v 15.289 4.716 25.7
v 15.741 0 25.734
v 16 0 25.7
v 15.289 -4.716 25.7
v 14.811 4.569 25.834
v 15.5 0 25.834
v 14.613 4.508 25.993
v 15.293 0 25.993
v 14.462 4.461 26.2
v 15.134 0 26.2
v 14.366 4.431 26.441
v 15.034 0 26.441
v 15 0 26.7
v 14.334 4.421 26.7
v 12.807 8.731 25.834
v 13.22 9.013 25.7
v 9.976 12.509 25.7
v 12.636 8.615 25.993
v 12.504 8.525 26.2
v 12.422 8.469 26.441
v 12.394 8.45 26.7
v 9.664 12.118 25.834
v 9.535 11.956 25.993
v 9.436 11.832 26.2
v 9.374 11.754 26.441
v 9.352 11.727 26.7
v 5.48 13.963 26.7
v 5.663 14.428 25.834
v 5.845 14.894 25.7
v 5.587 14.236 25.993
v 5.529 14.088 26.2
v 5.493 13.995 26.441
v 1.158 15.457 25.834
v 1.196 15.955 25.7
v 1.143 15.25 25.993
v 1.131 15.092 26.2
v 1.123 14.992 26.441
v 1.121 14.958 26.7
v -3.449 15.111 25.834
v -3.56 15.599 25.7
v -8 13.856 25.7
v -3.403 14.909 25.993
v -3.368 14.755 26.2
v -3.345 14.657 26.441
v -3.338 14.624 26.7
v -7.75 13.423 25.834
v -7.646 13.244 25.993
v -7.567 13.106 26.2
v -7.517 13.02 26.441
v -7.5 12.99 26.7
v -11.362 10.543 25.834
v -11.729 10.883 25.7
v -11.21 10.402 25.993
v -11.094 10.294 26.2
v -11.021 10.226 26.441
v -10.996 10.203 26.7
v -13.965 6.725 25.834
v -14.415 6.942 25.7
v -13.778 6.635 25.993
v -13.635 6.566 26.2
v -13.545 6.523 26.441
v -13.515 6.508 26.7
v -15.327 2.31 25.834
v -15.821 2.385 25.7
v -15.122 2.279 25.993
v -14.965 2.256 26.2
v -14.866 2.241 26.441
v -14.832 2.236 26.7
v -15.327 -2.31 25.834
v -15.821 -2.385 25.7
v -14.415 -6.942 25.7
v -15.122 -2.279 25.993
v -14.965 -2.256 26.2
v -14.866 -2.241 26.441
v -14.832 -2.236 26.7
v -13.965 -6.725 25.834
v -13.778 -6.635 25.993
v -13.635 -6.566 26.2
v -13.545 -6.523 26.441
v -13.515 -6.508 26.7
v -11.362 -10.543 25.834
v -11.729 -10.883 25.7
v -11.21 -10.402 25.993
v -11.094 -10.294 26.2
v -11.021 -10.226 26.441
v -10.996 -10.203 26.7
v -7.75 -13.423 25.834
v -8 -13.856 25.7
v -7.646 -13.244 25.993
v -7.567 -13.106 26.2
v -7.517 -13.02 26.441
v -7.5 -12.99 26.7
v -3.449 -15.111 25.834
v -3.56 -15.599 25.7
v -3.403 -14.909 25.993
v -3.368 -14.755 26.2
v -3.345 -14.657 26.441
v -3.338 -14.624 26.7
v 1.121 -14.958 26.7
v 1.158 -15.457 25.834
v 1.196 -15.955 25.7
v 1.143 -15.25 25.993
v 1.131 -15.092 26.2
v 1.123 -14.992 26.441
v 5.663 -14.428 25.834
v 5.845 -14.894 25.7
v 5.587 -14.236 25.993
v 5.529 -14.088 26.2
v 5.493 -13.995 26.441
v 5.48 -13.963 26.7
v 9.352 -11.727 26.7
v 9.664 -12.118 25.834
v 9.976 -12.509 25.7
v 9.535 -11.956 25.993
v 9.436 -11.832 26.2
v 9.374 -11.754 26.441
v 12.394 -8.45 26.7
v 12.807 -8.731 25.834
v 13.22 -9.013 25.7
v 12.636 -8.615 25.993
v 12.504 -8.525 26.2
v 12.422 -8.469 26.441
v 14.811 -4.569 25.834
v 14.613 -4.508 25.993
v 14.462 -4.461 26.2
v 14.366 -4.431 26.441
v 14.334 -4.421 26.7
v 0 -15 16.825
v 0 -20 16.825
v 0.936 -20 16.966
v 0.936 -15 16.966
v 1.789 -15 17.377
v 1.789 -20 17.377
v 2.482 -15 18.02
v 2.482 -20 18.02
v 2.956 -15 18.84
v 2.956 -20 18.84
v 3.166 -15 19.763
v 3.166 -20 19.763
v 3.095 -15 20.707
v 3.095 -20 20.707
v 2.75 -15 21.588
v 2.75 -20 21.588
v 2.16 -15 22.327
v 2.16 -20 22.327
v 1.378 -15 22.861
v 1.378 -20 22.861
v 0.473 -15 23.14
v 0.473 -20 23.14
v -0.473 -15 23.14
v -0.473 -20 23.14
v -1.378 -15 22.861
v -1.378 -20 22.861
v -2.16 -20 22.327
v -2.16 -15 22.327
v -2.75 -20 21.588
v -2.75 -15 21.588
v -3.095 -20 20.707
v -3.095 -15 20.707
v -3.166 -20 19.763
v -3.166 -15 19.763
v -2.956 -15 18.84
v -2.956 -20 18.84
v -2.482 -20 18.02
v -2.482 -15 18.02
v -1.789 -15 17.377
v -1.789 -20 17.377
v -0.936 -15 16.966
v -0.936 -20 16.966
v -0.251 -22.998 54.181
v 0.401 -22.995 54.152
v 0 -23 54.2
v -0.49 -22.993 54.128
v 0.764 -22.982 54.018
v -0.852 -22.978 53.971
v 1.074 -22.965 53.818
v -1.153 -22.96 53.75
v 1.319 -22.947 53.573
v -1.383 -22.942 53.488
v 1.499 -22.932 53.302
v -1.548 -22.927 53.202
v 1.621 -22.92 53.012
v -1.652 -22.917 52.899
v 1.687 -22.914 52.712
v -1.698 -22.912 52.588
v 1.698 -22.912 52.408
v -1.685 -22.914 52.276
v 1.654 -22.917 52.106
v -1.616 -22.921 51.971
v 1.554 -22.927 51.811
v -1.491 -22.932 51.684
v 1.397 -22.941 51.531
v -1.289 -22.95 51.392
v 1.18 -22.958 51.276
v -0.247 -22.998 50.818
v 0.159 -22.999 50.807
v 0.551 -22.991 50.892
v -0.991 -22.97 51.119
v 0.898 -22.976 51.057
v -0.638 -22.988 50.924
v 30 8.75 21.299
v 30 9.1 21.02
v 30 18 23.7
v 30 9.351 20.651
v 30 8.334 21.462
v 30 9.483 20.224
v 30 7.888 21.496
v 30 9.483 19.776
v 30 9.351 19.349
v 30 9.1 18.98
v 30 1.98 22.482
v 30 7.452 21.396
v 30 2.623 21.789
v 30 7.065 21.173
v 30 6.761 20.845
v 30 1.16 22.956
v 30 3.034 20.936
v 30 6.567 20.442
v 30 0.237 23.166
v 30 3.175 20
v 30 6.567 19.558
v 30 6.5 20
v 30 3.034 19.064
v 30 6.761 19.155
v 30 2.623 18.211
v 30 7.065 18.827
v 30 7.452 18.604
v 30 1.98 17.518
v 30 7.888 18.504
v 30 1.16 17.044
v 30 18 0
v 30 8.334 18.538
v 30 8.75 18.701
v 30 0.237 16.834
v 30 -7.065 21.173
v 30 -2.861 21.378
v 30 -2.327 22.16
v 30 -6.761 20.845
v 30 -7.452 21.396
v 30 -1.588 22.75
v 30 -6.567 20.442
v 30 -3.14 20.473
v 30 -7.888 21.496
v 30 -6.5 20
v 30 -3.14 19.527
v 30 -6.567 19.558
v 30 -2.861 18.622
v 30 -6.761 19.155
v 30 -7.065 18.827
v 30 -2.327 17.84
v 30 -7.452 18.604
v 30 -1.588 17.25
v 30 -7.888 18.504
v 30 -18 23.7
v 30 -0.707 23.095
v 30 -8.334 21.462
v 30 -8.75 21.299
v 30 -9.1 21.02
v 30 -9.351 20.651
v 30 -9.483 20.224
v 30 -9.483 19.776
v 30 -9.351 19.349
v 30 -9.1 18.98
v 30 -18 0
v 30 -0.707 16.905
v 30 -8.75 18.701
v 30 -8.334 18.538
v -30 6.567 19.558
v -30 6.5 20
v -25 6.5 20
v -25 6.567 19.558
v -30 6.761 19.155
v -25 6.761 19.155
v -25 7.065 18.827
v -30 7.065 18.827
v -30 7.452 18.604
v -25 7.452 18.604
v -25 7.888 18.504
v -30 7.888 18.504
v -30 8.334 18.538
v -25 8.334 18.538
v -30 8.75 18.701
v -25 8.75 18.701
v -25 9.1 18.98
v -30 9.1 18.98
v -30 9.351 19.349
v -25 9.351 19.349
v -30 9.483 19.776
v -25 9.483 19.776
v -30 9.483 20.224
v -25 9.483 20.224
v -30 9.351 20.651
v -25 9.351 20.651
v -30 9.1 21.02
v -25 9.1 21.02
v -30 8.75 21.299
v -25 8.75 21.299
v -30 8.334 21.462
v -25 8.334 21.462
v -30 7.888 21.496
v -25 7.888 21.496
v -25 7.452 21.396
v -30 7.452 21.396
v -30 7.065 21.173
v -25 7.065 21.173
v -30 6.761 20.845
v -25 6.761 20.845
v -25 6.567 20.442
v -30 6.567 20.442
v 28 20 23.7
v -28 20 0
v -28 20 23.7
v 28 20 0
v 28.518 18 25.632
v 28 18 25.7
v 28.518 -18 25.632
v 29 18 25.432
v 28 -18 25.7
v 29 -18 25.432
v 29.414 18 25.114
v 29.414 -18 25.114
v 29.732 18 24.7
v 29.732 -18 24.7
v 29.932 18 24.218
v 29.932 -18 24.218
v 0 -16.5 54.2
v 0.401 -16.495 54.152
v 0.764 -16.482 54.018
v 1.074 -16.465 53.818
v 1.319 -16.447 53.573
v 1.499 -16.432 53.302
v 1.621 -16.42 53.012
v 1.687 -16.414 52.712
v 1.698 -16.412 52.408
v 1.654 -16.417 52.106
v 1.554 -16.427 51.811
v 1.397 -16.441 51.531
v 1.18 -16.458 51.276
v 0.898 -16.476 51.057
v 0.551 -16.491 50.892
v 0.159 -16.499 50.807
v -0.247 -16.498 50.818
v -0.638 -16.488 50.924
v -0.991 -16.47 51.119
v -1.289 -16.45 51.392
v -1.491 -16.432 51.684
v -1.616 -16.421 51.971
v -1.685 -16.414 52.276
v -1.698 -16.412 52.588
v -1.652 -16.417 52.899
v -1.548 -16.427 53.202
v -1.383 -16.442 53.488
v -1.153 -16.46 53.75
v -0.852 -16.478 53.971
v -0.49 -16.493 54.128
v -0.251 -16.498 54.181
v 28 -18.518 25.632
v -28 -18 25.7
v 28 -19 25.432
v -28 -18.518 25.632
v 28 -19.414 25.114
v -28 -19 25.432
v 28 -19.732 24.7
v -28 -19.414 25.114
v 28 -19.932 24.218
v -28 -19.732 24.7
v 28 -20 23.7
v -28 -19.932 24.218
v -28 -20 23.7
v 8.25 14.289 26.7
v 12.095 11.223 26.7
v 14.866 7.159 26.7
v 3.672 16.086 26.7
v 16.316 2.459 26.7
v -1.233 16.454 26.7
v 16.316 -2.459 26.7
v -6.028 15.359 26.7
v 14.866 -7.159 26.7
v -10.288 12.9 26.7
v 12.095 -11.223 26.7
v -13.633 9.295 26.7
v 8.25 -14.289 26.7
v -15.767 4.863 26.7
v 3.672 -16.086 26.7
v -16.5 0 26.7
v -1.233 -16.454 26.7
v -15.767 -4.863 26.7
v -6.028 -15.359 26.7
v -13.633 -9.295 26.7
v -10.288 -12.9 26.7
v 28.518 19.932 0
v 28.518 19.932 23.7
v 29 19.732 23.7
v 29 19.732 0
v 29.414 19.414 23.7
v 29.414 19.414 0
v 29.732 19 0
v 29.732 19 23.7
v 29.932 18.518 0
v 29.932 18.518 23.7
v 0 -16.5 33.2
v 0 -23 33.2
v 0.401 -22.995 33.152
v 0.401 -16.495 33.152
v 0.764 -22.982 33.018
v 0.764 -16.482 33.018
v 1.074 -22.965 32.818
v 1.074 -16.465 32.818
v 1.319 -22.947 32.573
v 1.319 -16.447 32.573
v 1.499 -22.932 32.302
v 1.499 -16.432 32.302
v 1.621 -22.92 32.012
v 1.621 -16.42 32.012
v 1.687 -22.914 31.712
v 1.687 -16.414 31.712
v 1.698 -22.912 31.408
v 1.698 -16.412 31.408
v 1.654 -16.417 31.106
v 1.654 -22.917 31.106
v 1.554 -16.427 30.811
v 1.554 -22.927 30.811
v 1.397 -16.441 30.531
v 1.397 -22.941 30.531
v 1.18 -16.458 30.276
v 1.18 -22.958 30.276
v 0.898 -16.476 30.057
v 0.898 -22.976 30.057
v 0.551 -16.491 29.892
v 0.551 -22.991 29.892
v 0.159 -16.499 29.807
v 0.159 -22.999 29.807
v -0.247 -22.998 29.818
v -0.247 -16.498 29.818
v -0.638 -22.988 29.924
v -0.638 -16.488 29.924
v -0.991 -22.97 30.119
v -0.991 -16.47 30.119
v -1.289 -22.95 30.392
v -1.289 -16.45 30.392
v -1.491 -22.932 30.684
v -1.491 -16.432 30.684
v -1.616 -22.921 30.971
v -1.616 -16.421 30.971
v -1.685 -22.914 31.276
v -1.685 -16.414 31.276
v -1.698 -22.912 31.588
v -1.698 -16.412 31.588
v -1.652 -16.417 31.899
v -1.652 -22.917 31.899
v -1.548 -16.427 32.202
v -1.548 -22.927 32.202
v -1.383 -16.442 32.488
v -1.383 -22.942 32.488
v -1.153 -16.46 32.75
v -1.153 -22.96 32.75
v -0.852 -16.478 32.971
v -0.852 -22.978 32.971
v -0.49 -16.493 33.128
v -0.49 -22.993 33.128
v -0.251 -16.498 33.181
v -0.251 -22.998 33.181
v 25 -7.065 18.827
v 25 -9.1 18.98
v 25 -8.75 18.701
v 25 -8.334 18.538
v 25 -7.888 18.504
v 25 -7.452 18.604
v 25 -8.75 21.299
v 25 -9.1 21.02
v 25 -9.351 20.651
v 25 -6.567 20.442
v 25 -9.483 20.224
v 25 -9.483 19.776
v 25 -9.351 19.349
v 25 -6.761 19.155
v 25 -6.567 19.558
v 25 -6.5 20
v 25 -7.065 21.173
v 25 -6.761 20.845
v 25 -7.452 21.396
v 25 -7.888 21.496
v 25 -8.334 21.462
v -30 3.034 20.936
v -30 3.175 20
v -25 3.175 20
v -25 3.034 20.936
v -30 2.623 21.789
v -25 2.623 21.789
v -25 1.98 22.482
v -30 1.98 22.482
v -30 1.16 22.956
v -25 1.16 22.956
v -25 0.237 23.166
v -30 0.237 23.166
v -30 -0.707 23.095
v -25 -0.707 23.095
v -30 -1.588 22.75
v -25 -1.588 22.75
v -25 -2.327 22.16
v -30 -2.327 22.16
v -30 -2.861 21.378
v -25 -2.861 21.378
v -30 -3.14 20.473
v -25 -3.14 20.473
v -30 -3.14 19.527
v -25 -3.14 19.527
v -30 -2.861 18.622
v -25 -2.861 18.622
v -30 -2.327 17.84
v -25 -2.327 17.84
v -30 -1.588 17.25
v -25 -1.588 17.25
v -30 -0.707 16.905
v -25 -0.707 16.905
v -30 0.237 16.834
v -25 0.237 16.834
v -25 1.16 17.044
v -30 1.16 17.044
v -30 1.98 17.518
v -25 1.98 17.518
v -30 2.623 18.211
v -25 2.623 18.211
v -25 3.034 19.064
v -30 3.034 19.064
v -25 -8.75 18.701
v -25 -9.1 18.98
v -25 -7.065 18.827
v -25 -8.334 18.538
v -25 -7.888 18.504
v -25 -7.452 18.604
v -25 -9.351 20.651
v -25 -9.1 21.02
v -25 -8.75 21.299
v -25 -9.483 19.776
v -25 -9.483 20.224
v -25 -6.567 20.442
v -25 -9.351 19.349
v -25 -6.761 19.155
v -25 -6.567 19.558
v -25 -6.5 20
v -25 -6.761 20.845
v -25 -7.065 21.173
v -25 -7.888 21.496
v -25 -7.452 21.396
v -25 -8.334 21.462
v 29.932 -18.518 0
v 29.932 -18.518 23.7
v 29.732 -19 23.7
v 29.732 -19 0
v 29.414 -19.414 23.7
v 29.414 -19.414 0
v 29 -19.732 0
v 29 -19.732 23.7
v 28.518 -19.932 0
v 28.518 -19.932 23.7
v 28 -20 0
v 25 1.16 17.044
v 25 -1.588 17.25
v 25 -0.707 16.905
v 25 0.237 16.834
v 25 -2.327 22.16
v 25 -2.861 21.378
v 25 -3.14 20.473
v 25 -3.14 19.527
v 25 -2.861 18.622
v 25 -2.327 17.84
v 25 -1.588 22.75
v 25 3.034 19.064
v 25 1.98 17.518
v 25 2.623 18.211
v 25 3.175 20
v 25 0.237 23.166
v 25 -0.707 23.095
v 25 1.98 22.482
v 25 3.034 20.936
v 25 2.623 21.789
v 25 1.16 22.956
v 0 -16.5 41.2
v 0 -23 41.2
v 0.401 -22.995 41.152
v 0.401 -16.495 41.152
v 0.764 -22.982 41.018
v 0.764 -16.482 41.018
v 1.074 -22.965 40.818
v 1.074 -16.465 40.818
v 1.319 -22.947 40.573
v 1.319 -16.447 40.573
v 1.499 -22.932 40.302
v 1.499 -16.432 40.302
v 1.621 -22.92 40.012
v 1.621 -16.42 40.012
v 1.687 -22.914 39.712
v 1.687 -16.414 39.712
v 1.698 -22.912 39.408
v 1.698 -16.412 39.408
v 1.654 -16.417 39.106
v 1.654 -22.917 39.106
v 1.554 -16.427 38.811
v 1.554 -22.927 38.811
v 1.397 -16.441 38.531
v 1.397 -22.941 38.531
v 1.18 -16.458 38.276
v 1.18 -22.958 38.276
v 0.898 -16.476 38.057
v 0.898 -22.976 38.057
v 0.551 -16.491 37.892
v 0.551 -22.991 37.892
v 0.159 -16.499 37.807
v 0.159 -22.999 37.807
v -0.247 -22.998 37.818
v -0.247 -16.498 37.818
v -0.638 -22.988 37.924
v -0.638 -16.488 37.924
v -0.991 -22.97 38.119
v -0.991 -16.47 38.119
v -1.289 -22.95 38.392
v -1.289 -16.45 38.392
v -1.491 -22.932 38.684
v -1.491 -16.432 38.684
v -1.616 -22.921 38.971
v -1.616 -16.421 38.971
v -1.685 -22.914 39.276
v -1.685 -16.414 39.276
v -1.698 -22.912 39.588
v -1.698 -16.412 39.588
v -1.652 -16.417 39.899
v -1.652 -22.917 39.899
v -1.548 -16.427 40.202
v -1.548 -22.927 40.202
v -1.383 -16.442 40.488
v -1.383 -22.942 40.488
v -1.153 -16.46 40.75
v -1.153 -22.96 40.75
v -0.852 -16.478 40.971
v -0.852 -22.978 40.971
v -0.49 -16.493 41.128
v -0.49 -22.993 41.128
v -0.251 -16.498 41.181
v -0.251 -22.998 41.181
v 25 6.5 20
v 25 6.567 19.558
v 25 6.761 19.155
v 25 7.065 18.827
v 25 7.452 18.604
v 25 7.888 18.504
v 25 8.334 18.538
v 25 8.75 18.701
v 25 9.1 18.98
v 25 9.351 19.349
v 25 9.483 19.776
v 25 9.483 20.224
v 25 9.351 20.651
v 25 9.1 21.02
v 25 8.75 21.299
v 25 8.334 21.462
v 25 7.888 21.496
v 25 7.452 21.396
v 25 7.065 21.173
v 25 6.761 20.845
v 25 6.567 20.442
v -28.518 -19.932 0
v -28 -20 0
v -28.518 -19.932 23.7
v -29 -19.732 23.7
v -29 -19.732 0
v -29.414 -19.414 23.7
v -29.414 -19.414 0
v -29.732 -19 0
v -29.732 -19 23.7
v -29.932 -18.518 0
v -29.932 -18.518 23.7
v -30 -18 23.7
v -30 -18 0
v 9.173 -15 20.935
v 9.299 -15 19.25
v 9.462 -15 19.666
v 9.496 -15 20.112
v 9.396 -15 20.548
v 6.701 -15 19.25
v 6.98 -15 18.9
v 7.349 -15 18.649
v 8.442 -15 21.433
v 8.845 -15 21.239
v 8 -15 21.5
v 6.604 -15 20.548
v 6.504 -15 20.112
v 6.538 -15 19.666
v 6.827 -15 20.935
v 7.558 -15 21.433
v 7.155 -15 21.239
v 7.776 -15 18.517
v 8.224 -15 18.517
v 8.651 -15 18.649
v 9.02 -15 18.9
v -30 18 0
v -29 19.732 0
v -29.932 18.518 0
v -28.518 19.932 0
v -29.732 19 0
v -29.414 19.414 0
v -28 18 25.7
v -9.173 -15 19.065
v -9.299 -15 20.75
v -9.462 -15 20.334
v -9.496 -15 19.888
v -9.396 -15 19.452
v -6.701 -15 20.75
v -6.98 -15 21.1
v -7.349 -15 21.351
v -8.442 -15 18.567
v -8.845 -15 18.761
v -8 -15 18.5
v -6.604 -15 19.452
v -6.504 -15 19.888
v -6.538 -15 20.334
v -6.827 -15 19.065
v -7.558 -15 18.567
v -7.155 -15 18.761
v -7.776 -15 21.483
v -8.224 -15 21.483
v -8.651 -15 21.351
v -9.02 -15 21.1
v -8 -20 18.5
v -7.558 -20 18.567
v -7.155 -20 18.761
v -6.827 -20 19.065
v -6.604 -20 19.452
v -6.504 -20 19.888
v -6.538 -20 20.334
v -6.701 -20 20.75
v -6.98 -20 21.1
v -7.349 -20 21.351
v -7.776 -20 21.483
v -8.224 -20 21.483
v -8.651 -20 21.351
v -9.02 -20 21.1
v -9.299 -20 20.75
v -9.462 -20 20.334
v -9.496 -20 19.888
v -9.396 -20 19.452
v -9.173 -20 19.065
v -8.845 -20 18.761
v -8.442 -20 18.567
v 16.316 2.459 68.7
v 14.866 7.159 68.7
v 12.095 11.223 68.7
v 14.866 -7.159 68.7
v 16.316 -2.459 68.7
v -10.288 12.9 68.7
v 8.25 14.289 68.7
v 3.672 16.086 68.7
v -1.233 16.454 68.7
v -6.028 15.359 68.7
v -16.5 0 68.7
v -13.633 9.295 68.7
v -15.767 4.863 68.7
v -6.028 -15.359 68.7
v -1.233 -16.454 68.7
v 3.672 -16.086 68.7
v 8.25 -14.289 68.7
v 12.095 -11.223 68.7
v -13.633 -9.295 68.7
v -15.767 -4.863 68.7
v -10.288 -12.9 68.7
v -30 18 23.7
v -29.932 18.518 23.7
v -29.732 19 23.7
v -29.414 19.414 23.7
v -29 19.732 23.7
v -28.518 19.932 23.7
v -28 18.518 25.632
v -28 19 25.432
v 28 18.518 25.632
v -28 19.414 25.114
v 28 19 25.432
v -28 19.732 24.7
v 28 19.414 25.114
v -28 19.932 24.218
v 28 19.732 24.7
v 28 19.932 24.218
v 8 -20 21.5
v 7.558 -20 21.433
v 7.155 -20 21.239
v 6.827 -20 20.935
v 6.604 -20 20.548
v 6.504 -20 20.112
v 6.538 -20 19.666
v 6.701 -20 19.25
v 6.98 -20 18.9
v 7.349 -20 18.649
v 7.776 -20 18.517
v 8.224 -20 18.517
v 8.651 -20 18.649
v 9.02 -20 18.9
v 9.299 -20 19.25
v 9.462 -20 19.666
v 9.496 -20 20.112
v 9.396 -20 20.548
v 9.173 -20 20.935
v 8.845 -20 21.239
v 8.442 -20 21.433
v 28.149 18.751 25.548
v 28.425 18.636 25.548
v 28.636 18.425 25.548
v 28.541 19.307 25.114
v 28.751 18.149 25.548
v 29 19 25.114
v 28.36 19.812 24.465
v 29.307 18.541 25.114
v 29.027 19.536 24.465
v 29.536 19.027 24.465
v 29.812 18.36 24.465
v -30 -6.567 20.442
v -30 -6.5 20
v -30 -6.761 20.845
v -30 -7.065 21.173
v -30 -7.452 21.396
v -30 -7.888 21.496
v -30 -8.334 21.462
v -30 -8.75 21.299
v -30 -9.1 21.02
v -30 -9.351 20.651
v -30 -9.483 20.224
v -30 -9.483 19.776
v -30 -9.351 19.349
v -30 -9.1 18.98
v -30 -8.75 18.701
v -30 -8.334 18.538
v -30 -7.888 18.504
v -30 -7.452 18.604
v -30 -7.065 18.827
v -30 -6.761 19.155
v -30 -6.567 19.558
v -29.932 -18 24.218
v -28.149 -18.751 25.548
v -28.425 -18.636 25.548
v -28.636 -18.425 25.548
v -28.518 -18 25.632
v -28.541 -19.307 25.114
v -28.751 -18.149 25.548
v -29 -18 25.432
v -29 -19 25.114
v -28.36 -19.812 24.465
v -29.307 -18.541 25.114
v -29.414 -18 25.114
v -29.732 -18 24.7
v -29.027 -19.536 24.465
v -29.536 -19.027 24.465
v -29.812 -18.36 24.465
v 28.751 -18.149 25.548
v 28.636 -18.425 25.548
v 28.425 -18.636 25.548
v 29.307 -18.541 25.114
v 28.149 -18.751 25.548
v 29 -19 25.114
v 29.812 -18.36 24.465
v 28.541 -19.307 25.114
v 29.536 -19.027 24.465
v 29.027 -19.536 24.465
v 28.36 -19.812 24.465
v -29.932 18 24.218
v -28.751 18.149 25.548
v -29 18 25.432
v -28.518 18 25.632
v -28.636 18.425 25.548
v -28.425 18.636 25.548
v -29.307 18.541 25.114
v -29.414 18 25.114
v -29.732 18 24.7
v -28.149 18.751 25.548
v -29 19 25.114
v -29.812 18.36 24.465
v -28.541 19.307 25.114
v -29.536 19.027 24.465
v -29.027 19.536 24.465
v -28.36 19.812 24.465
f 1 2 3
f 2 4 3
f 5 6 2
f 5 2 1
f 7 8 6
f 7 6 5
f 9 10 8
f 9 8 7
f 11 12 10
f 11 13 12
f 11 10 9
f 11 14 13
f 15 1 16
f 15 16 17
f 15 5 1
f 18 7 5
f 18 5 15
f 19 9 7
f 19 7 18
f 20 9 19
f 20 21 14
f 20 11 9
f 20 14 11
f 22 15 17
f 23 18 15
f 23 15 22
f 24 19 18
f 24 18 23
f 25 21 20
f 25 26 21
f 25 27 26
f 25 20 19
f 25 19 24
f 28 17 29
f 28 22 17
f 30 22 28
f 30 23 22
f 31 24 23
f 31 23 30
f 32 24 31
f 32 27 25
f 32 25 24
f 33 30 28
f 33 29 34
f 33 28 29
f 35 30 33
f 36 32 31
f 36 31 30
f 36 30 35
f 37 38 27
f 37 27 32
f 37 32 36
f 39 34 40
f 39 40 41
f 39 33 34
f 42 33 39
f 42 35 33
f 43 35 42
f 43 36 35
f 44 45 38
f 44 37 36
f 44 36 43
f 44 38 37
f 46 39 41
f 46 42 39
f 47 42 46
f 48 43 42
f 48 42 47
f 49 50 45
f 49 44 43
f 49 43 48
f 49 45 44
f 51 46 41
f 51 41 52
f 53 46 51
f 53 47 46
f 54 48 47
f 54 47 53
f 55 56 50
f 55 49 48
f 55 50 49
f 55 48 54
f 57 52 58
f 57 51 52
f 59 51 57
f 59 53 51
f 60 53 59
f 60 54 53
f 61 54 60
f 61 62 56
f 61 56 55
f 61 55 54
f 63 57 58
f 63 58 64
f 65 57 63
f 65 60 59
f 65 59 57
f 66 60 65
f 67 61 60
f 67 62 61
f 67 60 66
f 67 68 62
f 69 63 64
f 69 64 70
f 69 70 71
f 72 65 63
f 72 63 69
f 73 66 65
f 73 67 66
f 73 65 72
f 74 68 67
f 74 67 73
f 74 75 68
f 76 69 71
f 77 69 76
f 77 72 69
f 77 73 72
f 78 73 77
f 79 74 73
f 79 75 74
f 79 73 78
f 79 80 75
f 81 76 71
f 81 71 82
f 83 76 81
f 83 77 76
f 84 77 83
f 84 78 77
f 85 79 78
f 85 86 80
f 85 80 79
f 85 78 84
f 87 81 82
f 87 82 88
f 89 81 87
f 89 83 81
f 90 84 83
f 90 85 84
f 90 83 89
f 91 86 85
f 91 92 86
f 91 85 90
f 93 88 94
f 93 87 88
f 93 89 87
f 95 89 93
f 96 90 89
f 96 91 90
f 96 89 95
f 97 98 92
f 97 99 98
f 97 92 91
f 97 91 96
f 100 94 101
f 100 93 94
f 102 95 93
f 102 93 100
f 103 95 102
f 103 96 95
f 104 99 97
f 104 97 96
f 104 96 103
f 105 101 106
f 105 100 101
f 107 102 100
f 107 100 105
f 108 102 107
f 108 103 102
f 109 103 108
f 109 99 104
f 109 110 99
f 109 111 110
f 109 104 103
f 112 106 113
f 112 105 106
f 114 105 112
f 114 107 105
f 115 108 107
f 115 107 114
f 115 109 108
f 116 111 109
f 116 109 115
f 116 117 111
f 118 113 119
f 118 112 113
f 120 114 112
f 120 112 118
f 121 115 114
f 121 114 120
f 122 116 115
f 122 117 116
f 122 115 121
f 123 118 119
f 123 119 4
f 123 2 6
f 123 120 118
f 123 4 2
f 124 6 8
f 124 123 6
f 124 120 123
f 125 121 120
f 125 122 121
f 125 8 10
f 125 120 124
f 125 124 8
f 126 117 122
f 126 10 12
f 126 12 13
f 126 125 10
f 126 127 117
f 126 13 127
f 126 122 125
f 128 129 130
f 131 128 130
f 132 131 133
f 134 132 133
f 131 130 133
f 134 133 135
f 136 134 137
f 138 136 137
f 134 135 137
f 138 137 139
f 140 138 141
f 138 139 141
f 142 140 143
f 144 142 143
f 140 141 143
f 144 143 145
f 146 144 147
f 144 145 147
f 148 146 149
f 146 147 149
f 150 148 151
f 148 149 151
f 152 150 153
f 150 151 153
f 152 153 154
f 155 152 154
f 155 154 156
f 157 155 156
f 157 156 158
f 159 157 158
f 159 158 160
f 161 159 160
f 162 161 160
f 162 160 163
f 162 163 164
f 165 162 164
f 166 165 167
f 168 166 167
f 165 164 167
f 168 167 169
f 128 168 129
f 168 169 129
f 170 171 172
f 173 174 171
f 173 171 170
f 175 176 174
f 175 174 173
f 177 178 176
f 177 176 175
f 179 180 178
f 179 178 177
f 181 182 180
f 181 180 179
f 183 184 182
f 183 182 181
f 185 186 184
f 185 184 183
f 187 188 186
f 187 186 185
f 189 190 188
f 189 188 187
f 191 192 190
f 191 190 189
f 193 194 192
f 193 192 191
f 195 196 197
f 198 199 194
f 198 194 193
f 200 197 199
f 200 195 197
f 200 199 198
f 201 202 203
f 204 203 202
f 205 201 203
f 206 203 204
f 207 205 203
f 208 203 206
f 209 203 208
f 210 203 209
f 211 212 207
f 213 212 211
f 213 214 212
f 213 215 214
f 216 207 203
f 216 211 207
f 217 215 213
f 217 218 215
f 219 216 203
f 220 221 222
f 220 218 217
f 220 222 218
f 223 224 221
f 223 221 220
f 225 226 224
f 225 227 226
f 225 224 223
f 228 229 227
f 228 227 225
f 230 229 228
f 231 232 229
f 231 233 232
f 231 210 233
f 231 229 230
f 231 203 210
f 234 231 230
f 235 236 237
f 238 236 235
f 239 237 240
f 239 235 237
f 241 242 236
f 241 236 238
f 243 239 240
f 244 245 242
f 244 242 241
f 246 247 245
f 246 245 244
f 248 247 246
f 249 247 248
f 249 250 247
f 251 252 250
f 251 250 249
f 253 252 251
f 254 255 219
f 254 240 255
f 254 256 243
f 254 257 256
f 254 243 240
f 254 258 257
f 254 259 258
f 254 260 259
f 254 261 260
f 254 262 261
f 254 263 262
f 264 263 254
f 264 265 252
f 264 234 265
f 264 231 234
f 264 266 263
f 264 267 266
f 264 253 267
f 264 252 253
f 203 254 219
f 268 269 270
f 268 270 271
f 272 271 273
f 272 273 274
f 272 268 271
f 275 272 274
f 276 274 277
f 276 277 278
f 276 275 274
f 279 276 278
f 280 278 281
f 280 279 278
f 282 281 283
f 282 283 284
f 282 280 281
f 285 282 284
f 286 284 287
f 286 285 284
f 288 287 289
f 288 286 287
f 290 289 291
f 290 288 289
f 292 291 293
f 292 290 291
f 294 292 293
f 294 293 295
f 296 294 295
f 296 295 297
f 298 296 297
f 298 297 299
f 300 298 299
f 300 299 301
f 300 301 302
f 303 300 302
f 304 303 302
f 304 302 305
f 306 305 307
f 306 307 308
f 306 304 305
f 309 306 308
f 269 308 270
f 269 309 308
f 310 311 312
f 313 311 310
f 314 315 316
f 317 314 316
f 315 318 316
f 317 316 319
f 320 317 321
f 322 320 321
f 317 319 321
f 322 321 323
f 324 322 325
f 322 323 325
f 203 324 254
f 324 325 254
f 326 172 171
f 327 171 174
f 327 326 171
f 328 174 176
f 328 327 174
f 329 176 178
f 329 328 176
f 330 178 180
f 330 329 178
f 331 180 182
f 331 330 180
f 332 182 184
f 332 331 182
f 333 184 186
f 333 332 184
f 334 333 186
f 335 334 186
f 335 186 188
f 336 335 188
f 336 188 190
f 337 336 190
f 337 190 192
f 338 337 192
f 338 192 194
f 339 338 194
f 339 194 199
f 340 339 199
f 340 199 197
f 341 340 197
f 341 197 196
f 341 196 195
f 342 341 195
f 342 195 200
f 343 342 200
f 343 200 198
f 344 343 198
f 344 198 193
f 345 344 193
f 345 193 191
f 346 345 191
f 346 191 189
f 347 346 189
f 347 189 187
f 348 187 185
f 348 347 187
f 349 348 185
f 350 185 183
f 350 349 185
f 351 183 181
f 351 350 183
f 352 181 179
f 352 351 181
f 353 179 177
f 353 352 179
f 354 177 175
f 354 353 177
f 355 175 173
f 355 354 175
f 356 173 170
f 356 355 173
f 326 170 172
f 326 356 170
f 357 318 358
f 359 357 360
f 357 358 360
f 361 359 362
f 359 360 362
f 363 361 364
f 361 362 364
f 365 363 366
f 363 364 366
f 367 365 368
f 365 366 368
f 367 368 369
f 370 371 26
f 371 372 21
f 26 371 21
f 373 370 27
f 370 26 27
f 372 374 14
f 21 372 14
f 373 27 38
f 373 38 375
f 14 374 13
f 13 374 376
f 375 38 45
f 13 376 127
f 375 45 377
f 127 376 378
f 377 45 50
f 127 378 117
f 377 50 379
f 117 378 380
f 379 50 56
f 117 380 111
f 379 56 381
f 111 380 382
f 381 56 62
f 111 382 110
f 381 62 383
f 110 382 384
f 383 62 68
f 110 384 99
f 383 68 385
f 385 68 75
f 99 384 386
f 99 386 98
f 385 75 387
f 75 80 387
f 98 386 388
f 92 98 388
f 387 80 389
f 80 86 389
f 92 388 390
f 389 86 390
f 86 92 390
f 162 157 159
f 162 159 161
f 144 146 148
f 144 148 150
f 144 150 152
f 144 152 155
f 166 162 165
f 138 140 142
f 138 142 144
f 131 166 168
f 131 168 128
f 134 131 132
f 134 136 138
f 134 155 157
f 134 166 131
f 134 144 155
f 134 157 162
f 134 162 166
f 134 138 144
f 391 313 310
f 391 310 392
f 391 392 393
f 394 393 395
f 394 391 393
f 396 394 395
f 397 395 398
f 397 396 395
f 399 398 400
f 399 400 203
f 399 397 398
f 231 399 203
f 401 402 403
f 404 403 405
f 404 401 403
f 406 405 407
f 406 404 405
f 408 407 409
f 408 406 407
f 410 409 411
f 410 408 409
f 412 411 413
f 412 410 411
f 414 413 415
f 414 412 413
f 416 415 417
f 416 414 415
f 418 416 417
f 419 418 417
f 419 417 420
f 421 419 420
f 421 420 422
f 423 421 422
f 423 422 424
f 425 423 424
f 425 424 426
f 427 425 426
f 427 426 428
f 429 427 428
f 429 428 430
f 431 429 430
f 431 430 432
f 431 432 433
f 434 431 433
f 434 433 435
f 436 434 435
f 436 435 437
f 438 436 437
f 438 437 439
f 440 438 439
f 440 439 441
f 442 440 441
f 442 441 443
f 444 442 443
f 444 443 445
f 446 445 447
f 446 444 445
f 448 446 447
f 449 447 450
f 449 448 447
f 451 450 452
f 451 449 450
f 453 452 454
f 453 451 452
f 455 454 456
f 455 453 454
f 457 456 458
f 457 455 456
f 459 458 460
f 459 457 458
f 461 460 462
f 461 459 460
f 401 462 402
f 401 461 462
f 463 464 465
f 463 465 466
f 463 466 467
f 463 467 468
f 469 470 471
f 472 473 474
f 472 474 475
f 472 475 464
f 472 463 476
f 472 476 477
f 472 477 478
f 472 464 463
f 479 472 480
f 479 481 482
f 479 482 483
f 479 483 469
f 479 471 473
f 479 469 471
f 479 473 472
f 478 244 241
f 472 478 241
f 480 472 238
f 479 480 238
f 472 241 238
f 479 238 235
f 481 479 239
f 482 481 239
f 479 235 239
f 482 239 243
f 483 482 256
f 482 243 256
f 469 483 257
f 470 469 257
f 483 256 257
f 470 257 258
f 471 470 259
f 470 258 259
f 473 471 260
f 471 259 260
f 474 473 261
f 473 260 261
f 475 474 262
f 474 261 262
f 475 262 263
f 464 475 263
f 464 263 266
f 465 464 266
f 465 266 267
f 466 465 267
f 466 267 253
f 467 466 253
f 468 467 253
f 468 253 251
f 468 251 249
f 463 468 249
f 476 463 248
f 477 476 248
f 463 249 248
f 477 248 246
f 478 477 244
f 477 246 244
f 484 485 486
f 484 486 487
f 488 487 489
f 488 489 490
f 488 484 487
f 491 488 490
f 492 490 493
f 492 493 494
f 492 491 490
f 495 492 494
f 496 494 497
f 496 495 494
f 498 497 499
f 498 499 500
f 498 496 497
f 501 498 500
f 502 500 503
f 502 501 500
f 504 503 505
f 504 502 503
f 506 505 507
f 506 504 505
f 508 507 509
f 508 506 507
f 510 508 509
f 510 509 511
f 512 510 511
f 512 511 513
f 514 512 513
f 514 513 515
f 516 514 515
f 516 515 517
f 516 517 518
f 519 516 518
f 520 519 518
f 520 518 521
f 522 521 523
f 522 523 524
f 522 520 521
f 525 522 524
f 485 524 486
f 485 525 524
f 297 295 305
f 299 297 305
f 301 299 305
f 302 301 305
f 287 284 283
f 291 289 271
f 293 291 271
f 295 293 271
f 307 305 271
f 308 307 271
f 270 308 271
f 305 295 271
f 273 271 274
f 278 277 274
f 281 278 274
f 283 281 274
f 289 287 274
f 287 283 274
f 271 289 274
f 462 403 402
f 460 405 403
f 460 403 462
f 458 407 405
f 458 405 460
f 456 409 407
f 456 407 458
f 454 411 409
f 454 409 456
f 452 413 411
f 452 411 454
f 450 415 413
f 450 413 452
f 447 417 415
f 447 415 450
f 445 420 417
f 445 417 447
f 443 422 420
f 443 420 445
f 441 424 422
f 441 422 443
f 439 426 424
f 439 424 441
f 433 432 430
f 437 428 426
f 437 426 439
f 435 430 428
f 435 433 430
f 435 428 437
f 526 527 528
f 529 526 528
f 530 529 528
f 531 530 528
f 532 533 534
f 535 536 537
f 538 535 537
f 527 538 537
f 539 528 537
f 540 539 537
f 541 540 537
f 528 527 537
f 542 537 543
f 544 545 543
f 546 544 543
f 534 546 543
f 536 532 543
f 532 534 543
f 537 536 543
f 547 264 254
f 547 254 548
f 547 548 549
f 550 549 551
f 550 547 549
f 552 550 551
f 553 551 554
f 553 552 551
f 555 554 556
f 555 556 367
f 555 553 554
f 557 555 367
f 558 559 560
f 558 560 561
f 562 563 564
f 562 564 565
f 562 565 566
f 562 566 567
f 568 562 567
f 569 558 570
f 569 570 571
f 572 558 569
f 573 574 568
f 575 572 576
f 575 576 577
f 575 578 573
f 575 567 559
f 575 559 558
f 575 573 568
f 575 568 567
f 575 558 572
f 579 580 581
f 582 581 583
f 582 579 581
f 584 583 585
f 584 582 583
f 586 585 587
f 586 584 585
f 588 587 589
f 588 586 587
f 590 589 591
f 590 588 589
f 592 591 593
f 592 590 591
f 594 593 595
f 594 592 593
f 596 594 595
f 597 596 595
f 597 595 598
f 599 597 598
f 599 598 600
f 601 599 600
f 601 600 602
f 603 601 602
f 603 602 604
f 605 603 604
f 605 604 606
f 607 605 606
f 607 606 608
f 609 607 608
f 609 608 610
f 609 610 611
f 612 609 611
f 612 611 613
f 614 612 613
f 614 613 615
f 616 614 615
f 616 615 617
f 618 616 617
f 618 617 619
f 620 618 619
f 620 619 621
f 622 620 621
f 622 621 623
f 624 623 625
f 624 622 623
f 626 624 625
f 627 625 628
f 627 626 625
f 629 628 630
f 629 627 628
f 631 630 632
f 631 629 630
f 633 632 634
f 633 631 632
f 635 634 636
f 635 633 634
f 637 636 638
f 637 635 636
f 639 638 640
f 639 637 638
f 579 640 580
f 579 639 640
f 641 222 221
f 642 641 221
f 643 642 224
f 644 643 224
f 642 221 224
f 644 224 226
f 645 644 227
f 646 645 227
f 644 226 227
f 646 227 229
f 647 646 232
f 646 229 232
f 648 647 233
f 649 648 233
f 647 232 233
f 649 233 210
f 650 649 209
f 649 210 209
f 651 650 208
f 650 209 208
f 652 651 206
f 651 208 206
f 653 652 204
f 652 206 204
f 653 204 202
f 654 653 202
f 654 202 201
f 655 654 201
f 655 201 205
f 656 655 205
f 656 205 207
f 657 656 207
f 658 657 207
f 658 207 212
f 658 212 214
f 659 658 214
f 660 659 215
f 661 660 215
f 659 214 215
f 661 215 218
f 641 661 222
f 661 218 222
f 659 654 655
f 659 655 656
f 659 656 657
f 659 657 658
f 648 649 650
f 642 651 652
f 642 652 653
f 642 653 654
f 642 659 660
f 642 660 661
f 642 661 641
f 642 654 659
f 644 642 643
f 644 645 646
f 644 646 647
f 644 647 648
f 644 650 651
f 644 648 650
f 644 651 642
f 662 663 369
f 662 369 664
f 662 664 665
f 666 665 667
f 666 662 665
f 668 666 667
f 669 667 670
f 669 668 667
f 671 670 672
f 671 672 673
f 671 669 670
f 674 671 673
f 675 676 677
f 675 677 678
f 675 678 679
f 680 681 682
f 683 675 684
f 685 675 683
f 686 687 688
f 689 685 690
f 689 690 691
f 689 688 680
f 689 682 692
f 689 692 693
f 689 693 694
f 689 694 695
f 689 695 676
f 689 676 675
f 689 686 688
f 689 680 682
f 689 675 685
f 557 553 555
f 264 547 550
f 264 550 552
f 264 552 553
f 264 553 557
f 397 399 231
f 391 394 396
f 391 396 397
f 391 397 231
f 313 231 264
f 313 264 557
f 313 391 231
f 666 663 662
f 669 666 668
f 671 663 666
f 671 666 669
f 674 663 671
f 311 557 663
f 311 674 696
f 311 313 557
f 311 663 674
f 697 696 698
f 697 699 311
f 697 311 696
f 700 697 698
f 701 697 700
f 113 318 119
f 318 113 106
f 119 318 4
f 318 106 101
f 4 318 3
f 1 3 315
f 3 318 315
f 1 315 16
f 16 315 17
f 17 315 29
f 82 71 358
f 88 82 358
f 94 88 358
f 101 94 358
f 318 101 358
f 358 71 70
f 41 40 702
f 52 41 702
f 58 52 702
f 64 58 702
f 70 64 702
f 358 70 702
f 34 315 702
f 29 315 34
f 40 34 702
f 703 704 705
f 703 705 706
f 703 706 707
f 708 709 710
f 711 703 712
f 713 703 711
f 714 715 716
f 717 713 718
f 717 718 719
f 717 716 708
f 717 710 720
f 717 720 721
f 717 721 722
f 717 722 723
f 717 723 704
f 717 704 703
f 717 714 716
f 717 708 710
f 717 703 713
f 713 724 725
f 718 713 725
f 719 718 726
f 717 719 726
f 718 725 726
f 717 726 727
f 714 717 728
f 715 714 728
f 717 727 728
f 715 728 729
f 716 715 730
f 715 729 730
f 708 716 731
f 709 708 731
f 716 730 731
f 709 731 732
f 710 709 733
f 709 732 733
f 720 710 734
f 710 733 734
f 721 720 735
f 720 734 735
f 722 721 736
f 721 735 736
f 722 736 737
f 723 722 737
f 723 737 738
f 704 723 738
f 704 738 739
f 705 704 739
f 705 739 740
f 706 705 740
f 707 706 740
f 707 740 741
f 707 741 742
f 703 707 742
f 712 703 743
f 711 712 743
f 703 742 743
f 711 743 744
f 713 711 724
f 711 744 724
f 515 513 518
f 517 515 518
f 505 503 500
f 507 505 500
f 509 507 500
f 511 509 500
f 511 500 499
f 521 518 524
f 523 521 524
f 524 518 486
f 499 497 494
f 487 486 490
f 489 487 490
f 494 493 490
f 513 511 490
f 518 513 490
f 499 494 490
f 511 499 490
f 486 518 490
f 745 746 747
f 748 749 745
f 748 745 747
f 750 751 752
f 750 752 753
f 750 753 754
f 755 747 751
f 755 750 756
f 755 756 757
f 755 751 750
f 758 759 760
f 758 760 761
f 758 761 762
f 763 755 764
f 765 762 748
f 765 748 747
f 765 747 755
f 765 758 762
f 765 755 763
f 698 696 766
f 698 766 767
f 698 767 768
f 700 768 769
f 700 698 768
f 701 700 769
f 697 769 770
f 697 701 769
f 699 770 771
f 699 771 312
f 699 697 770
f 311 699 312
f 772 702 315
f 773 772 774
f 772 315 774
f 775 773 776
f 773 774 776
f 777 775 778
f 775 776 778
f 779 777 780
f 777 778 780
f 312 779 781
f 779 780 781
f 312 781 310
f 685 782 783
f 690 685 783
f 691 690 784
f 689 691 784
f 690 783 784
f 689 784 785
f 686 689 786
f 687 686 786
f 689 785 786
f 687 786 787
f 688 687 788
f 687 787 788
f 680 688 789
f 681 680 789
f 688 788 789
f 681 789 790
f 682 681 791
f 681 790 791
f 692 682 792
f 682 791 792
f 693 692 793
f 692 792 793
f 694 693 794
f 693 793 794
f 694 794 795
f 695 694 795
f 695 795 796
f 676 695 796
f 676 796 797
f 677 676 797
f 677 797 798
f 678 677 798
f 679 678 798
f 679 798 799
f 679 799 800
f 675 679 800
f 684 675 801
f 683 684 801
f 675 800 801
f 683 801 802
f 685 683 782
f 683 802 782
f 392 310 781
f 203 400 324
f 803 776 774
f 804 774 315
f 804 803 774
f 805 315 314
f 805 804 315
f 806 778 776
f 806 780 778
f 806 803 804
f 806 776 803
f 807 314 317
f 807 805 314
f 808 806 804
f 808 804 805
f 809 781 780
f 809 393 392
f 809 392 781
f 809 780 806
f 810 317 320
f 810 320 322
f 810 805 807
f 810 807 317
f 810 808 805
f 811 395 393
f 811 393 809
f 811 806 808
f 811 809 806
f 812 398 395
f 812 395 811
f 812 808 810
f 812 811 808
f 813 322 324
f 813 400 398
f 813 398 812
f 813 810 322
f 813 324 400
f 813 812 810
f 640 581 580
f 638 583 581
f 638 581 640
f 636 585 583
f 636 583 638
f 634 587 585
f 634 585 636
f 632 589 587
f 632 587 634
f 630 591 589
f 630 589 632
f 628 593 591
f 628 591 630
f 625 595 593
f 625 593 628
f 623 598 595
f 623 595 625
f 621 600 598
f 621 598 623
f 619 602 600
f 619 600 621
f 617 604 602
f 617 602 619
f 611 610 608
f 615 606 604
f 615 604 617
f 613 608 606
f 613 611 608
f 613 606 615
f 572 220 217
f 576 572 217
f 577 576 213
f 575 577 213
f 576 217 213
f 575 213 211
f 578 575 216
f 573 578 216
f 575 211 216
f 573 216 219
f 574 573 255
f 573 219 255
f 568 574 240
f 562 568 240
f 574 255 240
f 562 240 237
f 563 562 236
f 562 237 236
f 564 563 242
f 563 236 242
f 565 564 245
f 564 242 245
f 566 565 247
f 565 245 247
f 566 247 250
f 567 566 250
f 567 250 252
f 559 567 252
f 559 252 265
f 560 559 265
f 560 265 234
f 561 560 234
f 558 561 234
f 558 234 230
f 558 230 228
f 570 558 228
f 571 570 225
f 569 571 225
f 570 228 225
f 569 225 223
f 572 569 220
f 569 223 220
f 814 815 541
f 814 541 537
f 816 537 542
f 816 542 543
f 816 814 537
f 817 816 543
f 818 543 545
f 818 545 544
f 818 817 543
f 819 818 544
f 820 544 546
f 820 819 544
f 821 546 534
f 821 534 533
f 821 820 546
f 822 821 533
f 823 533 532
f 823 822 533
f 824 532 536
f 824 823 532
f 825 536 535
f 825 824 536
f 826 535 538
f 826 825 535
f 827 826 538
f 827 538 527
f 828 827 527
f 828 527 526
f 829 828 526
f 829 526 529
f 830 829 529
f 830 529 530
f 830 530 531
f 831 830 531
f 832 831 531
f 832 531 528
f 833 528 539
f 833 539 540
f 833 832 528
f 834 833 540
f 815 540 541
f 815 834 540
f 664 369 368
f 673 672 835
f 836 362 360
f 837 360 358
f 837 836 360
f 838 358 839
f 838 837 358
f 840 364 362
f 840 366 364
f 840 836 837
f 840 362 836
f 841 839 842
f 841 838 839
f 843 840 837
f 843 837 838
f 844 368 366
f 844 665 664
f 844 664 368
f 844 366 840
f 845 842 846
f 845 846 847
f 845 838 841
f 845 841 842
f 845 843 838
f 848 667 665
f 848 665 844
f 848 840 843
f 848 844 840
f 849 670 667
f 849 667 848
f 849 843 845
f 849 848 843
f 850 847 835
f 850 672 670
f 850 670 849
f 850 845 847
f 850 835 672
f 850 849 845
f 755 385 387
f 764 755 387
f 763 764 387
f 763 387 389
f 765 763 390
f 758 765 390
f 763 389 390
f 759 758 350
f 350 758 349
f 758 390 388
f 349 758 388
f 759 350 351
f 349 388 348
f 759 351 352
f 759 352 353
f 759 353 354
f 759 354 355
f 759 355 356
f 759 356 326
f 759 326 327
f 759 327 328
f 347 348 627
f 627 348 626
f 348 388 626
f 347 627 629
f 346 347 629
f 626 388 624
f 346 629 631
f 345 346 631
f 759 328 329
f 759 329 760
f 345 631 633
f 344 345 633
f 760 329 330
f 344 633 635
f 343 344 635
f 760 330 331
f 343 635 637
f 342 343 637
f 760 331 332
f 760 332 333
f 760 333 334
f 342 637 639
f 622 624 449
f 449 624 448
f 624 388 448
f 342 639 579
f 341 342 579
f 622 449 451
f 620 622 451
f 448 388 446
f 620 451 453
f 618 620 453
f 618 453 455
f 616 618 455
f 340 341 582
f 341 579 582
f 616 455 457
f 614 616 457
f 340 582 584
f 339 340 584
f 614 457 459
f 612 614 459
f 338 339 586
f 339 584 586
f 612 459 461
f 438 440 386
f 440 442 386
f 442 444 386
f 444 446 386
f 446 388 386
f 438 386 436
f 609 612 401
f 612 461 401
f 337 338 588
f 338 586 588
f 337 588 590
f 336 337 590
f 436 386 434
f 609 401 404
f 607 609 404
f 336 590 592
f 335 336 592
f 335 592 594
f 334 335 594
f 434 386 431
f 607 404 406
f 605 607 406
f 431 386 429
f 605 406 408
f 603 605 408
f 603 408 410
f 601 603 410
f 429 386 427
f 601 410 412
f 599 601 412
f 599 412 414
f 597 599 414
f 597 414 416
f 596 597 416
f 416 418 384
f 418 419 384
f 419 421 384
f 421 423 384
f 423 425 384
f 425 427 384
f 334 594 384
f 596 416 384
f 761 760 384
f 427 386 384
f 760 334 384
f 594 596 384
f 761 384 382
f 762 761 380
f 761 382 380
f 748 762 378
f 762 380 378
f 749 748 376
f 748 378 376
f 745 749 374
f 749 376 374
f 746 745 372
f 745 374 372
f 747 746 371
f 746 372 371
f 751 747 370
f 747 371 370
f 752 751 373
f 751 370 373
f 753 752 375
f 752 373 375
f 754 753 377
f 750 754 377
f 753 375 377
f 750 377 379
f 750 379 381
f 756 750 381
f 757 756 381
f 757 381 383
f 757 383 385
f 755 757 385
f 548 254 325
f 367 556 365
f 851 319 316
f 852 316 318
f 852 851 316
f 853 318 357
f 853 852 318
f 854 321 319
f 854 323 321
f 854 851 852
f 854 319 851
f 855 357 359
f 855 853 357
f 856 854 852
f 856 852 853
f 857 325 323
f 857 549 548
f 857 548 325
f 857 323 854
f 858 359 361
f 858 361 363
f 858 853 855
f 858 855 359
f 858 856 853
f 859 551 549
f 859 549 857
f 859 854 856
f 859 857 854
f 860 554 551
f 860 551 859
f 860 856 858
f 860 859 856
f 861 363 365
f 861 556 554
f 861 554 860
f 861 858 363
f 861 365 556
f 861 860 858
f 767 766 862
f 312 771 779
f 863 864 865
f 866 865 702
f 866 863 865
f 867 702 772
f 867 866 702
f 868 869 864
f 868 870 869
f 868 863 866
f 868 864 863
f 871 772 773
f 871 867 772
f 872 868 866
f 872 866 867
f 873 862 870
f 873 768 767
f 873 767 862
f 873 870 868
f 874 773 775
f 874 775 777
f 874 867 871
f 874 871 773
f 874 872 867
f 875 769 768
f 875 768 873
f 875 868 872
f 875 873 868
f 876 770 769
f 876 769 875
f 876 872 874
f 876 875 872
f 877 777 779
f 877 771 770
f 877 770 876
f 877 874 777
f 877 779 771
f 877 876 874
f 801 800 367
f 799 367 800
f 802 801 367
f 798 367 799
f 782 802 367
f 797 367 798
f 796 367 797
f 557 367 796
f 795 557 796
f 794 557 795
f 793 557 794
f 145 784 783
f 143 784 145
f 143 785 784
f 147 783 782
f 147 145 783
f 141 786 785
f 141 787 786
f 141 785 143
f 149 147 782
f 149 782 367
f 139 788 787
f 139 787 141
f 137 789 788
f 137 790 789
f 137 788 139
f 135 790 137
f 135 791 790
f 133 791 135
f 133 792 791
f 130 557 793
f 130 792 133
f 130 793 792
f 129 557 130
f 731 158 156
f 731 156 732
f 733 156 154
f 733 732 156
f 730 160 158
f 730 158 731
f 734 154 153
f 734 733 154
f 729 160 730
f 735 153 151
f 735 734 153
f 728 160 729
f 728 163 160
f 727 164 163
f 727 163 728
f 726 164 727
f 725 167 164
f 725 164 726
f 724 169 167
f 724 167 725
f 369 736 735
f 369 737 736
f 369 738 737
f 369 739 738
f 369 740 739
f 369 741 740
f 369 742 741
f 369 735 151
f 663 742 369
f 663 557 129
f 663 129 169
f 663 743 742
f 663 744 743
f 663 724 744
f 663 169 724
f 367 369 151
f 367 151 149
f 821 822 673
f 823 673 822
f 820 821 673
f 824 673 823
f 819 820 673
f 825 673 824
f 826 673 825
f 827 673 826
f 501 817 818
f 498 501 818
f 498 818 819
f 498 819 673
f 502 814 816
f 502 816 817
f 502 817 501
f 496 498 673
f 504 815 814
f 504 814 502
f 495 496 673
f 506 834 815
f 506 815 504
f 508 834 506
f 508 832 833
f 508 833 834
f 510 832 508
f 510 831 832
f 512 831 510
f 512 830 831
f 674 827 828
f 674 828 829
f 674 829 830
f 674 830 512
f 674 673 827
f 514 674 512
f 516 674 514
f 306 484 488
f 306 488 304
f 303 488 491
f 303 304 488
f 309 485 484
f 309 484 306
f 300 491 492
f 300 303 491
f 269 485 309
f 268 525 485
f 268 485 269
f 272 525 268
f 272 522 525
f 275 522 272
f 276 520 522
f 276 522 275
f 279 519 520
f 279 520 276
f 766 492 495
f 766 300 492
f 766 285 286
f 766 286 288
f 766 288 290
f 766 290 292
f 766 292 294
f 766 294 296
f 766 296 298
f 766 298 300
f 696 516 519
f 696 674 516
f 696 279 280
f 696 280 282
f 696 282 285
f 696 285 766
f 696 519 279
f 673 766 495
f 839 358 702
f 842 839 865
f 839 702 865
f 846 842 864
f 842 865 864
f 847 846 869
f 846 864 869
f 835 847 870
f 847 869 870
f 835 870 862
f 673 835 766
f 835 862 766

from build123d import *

# Parameters (mm, degrees)
BOSS_EXTRUDE1_DEPTH      = 25.7
SKETCH2_R                = 15
BOSS_EXTRUDE2_DEPTH      = 1
FILLET1_R                = 1
FILLET2_R                = 2
SKETCH3_R                = 16.5
BOSS_EXTRUDE3_DEPTH      = 42
SKETCH4_R                = 3.175
SKETCH4_R_2              = 1.5
CUT_EXTRUDE1_DEPTH       = 5
BOSS_EXTRUDE4_REACH      = 79.587
BOSS_EXTRUDE4_END_RADIUS = 16.5
SKETCH5_R                = 1.7
SKETCH6_R                = 3.175
SKETCH6_R_2              = 1.5
CUT_EXTRUDE2_DEPTH       = 5


with BuildPart() as part:
    # Sketch1 → Boss-Extrude1 (new body)
    with BuildSketch(Plane.XY):
        with BuildLine():
            Line((-28, 20), (28, 20))
            ThreePointArc((28, 20), (29.414213562, 19.414213562), (30, 18))
            Line((30, 18), (30, -18))
            ThreePointArc((30, -18), (29.414213562, -19.414213562), (28, -20))
            Line((28, -20), (-28, -20))
            ThreePointArc((-28, -20), (-29.414213562, -19.414213562), (-30, -18))
            Line((-30, -18), (-30, 18))
            ThreePointArc((-30, 18), (-29.414213562, 19.414213562), (-28, 20))
        make_face()
    extrude(amount=BOSS_EXTRUDE1_DEPTH)

    # Sketch2 → Boss-Extrude2 (add)
    with BuildSketch(Plane.XY.offset(25.7)):
        Circle(SKETCH2_R)
    extrude(amount=BOSS_EXTRUDE2_DEPTH)

    # Fillet1
    fillet1_edges = [part.edges().sort_by_distance(p)[0] for p in [
        (-15, 0, 25.7),
    ]]
    fillet(fillet1_edges, radius=FILLET1_R - 0.0001)  # a hair under: the kernel refuses the full size

    # Fillet2
    fillet2_edges = [part.edges().sort_by_distance(p)[0] for p in [
        (29.414213562, -19.414213562, 25.7),
        (30, 0, 25.7),
        (29.414213562, 19.414213562, 25.7),
        (0, 20, 25.7),
        (-29.414213562, 19.414213562, 25.7),
        (-30, 0, 25.7),
        (-29.414213562, -19.414213562, 25.7),
        (0, -20, 25.7),
    ]]
    fillet(fillet2_edges, radius=FILLET2_R)

    # Sketch3 → Boss-Extrude3 (add)
    with BuildSketch(Plane.XY.offset(26.7)):
        with Locations(Location((0, 0, 0), (0, 0, 180))):
            Circle(SKETCH3_R)
    extrude(amount=BOSS_EXTRUDE3_DEPTH)

    # Sketch4 → Cut-Extrude1 (cut)
    with BuildSketch(Plane.XZ.offset(20)):
        with Locations(Location((0, 20, 0), (0, 0, 270))):
            Circle(SKETCH4_R)
        with Locations(Location((-8, 20, 0), (0, 0, 270))):
            Circle(SKETCH4_R_2)
        with Locations(Location((8, 20, 0), (0, 0, 90))):
            Circle(SKETCH4_R_2)
    extrude(amount=-CUT_EXTRUDE1_DEPTH, mode=Mode.SUBTRACT)

    # Boss-Extrude4: up to this cylinder (the profile starts inside it)
    boss_extrude4_end = Plane(origin=(0, -6.5, 42), z_dir=(0, 0, -1)) * Cylinder(BOSS_EXTRUDE4_END_RADIUS, 214.174, mode=Mode.PRIVATE)
    # Sketch5 → Boss-Extrude4 (add, up to the surface)
    with BuildSketch(Plane(origin=(0, 0, 0), x_dir=(1, 0, 0), z_dir=(0, 1, 0)), mode=Mode.PRIVATE) as boss_extrude4_sk1:
        with Locations(Location((0, -31.5, 0), (0, 0, 270))):
            Circle(SKETCH5_R)
    boss_extrude4_tool1 = extrude(boss_extrude4_sk1.sketch, amount=-BOSS_EXTRUDE4_REACH, mode=Mode.PRIVATE) & boss_extrude4_end
    add(boss_extrude4_tool1.solids().sort_by_distance((0, 0, 31.5))[0])
    # Sketch5 → Boss-Extrude4 (add, up to the surface)
    with BuildSketch(Plane(origin=(0, 0, 0), x_dir=(1, 0, 0), z_dir=(0, 1, 0)), mode=Mode.PRIVATE) as boss_extrude4_sk2:
        with Locations(Location((0, -39.5, 0), (0, 0, 270))):
            Circle(SKETCH5_R)
    boss_extrude4_tool2 = extrude(boss_extrude4_sk2.sketch, amount=-BOSS_EXTRUDE4_REACH, mode=Mode.PRIVATE) & boss_extrude4_end
    add(boss_extrude4_tool2.solids().sort_by_distance((0, 0, 39.5))[0])
    # Sketch5 → Boss-Extrude4 (add, up to the surface)
    with BuildSketch(Plane(origin=(0, 0, 0), x_dir=(1, 0, 0), z_dir=(0, 1, 0)), mode=Mode.PRIVATE) as boss_extrude4_sk3:
        with Locations(Location((0, -52.5, 0), (0, 0, 270))):
            Circle(SKETCH5_R)
    boss_extrude4_tool3 = extrude(boss_extrude4_sk3.sketch, amount=-BOSS_EXTRUDE4_REACH, mode=Mode.PRIVATE) & boss_extrude4_end
    add(boss_extrude4_tool3.solids().sort_by_distance((0, 0, 52.5))[0])

    # Sketch6 → Cut-Extrude2 (cut)
    with BuildSketch(Plane(origin=(30, 0, 0), x_dir=(0, 0, -1), z_dir=(1, 0, 0))):
        with Locations(Location((-20, 0, 0), (0, 0, 90))):
            Circle(SKETCH6_R)
        with Locations(Location((-20, -8, 0), (0, 0, 90))):
            Circle(SKETCH6_R_2)
        with Locations(Location((-20, 8, 0), (0, 0, 270))):
            Circle(SKETCH6_R_2)
    cut_extrude2 = extrude(amount=-CUT_EXTRUDE2_DEPTH, mode=Mode.SUBTRACT)

    # Mirror1: Cut-Extrude2 across plane
    add(cut_extrude2.mirror(Plane(origin=(0, 0, 0), x_dir=(0, 0, 1), z_dir=(1, 0, 0))), mode=Mode.SUBTRACT)


solid = part.part
